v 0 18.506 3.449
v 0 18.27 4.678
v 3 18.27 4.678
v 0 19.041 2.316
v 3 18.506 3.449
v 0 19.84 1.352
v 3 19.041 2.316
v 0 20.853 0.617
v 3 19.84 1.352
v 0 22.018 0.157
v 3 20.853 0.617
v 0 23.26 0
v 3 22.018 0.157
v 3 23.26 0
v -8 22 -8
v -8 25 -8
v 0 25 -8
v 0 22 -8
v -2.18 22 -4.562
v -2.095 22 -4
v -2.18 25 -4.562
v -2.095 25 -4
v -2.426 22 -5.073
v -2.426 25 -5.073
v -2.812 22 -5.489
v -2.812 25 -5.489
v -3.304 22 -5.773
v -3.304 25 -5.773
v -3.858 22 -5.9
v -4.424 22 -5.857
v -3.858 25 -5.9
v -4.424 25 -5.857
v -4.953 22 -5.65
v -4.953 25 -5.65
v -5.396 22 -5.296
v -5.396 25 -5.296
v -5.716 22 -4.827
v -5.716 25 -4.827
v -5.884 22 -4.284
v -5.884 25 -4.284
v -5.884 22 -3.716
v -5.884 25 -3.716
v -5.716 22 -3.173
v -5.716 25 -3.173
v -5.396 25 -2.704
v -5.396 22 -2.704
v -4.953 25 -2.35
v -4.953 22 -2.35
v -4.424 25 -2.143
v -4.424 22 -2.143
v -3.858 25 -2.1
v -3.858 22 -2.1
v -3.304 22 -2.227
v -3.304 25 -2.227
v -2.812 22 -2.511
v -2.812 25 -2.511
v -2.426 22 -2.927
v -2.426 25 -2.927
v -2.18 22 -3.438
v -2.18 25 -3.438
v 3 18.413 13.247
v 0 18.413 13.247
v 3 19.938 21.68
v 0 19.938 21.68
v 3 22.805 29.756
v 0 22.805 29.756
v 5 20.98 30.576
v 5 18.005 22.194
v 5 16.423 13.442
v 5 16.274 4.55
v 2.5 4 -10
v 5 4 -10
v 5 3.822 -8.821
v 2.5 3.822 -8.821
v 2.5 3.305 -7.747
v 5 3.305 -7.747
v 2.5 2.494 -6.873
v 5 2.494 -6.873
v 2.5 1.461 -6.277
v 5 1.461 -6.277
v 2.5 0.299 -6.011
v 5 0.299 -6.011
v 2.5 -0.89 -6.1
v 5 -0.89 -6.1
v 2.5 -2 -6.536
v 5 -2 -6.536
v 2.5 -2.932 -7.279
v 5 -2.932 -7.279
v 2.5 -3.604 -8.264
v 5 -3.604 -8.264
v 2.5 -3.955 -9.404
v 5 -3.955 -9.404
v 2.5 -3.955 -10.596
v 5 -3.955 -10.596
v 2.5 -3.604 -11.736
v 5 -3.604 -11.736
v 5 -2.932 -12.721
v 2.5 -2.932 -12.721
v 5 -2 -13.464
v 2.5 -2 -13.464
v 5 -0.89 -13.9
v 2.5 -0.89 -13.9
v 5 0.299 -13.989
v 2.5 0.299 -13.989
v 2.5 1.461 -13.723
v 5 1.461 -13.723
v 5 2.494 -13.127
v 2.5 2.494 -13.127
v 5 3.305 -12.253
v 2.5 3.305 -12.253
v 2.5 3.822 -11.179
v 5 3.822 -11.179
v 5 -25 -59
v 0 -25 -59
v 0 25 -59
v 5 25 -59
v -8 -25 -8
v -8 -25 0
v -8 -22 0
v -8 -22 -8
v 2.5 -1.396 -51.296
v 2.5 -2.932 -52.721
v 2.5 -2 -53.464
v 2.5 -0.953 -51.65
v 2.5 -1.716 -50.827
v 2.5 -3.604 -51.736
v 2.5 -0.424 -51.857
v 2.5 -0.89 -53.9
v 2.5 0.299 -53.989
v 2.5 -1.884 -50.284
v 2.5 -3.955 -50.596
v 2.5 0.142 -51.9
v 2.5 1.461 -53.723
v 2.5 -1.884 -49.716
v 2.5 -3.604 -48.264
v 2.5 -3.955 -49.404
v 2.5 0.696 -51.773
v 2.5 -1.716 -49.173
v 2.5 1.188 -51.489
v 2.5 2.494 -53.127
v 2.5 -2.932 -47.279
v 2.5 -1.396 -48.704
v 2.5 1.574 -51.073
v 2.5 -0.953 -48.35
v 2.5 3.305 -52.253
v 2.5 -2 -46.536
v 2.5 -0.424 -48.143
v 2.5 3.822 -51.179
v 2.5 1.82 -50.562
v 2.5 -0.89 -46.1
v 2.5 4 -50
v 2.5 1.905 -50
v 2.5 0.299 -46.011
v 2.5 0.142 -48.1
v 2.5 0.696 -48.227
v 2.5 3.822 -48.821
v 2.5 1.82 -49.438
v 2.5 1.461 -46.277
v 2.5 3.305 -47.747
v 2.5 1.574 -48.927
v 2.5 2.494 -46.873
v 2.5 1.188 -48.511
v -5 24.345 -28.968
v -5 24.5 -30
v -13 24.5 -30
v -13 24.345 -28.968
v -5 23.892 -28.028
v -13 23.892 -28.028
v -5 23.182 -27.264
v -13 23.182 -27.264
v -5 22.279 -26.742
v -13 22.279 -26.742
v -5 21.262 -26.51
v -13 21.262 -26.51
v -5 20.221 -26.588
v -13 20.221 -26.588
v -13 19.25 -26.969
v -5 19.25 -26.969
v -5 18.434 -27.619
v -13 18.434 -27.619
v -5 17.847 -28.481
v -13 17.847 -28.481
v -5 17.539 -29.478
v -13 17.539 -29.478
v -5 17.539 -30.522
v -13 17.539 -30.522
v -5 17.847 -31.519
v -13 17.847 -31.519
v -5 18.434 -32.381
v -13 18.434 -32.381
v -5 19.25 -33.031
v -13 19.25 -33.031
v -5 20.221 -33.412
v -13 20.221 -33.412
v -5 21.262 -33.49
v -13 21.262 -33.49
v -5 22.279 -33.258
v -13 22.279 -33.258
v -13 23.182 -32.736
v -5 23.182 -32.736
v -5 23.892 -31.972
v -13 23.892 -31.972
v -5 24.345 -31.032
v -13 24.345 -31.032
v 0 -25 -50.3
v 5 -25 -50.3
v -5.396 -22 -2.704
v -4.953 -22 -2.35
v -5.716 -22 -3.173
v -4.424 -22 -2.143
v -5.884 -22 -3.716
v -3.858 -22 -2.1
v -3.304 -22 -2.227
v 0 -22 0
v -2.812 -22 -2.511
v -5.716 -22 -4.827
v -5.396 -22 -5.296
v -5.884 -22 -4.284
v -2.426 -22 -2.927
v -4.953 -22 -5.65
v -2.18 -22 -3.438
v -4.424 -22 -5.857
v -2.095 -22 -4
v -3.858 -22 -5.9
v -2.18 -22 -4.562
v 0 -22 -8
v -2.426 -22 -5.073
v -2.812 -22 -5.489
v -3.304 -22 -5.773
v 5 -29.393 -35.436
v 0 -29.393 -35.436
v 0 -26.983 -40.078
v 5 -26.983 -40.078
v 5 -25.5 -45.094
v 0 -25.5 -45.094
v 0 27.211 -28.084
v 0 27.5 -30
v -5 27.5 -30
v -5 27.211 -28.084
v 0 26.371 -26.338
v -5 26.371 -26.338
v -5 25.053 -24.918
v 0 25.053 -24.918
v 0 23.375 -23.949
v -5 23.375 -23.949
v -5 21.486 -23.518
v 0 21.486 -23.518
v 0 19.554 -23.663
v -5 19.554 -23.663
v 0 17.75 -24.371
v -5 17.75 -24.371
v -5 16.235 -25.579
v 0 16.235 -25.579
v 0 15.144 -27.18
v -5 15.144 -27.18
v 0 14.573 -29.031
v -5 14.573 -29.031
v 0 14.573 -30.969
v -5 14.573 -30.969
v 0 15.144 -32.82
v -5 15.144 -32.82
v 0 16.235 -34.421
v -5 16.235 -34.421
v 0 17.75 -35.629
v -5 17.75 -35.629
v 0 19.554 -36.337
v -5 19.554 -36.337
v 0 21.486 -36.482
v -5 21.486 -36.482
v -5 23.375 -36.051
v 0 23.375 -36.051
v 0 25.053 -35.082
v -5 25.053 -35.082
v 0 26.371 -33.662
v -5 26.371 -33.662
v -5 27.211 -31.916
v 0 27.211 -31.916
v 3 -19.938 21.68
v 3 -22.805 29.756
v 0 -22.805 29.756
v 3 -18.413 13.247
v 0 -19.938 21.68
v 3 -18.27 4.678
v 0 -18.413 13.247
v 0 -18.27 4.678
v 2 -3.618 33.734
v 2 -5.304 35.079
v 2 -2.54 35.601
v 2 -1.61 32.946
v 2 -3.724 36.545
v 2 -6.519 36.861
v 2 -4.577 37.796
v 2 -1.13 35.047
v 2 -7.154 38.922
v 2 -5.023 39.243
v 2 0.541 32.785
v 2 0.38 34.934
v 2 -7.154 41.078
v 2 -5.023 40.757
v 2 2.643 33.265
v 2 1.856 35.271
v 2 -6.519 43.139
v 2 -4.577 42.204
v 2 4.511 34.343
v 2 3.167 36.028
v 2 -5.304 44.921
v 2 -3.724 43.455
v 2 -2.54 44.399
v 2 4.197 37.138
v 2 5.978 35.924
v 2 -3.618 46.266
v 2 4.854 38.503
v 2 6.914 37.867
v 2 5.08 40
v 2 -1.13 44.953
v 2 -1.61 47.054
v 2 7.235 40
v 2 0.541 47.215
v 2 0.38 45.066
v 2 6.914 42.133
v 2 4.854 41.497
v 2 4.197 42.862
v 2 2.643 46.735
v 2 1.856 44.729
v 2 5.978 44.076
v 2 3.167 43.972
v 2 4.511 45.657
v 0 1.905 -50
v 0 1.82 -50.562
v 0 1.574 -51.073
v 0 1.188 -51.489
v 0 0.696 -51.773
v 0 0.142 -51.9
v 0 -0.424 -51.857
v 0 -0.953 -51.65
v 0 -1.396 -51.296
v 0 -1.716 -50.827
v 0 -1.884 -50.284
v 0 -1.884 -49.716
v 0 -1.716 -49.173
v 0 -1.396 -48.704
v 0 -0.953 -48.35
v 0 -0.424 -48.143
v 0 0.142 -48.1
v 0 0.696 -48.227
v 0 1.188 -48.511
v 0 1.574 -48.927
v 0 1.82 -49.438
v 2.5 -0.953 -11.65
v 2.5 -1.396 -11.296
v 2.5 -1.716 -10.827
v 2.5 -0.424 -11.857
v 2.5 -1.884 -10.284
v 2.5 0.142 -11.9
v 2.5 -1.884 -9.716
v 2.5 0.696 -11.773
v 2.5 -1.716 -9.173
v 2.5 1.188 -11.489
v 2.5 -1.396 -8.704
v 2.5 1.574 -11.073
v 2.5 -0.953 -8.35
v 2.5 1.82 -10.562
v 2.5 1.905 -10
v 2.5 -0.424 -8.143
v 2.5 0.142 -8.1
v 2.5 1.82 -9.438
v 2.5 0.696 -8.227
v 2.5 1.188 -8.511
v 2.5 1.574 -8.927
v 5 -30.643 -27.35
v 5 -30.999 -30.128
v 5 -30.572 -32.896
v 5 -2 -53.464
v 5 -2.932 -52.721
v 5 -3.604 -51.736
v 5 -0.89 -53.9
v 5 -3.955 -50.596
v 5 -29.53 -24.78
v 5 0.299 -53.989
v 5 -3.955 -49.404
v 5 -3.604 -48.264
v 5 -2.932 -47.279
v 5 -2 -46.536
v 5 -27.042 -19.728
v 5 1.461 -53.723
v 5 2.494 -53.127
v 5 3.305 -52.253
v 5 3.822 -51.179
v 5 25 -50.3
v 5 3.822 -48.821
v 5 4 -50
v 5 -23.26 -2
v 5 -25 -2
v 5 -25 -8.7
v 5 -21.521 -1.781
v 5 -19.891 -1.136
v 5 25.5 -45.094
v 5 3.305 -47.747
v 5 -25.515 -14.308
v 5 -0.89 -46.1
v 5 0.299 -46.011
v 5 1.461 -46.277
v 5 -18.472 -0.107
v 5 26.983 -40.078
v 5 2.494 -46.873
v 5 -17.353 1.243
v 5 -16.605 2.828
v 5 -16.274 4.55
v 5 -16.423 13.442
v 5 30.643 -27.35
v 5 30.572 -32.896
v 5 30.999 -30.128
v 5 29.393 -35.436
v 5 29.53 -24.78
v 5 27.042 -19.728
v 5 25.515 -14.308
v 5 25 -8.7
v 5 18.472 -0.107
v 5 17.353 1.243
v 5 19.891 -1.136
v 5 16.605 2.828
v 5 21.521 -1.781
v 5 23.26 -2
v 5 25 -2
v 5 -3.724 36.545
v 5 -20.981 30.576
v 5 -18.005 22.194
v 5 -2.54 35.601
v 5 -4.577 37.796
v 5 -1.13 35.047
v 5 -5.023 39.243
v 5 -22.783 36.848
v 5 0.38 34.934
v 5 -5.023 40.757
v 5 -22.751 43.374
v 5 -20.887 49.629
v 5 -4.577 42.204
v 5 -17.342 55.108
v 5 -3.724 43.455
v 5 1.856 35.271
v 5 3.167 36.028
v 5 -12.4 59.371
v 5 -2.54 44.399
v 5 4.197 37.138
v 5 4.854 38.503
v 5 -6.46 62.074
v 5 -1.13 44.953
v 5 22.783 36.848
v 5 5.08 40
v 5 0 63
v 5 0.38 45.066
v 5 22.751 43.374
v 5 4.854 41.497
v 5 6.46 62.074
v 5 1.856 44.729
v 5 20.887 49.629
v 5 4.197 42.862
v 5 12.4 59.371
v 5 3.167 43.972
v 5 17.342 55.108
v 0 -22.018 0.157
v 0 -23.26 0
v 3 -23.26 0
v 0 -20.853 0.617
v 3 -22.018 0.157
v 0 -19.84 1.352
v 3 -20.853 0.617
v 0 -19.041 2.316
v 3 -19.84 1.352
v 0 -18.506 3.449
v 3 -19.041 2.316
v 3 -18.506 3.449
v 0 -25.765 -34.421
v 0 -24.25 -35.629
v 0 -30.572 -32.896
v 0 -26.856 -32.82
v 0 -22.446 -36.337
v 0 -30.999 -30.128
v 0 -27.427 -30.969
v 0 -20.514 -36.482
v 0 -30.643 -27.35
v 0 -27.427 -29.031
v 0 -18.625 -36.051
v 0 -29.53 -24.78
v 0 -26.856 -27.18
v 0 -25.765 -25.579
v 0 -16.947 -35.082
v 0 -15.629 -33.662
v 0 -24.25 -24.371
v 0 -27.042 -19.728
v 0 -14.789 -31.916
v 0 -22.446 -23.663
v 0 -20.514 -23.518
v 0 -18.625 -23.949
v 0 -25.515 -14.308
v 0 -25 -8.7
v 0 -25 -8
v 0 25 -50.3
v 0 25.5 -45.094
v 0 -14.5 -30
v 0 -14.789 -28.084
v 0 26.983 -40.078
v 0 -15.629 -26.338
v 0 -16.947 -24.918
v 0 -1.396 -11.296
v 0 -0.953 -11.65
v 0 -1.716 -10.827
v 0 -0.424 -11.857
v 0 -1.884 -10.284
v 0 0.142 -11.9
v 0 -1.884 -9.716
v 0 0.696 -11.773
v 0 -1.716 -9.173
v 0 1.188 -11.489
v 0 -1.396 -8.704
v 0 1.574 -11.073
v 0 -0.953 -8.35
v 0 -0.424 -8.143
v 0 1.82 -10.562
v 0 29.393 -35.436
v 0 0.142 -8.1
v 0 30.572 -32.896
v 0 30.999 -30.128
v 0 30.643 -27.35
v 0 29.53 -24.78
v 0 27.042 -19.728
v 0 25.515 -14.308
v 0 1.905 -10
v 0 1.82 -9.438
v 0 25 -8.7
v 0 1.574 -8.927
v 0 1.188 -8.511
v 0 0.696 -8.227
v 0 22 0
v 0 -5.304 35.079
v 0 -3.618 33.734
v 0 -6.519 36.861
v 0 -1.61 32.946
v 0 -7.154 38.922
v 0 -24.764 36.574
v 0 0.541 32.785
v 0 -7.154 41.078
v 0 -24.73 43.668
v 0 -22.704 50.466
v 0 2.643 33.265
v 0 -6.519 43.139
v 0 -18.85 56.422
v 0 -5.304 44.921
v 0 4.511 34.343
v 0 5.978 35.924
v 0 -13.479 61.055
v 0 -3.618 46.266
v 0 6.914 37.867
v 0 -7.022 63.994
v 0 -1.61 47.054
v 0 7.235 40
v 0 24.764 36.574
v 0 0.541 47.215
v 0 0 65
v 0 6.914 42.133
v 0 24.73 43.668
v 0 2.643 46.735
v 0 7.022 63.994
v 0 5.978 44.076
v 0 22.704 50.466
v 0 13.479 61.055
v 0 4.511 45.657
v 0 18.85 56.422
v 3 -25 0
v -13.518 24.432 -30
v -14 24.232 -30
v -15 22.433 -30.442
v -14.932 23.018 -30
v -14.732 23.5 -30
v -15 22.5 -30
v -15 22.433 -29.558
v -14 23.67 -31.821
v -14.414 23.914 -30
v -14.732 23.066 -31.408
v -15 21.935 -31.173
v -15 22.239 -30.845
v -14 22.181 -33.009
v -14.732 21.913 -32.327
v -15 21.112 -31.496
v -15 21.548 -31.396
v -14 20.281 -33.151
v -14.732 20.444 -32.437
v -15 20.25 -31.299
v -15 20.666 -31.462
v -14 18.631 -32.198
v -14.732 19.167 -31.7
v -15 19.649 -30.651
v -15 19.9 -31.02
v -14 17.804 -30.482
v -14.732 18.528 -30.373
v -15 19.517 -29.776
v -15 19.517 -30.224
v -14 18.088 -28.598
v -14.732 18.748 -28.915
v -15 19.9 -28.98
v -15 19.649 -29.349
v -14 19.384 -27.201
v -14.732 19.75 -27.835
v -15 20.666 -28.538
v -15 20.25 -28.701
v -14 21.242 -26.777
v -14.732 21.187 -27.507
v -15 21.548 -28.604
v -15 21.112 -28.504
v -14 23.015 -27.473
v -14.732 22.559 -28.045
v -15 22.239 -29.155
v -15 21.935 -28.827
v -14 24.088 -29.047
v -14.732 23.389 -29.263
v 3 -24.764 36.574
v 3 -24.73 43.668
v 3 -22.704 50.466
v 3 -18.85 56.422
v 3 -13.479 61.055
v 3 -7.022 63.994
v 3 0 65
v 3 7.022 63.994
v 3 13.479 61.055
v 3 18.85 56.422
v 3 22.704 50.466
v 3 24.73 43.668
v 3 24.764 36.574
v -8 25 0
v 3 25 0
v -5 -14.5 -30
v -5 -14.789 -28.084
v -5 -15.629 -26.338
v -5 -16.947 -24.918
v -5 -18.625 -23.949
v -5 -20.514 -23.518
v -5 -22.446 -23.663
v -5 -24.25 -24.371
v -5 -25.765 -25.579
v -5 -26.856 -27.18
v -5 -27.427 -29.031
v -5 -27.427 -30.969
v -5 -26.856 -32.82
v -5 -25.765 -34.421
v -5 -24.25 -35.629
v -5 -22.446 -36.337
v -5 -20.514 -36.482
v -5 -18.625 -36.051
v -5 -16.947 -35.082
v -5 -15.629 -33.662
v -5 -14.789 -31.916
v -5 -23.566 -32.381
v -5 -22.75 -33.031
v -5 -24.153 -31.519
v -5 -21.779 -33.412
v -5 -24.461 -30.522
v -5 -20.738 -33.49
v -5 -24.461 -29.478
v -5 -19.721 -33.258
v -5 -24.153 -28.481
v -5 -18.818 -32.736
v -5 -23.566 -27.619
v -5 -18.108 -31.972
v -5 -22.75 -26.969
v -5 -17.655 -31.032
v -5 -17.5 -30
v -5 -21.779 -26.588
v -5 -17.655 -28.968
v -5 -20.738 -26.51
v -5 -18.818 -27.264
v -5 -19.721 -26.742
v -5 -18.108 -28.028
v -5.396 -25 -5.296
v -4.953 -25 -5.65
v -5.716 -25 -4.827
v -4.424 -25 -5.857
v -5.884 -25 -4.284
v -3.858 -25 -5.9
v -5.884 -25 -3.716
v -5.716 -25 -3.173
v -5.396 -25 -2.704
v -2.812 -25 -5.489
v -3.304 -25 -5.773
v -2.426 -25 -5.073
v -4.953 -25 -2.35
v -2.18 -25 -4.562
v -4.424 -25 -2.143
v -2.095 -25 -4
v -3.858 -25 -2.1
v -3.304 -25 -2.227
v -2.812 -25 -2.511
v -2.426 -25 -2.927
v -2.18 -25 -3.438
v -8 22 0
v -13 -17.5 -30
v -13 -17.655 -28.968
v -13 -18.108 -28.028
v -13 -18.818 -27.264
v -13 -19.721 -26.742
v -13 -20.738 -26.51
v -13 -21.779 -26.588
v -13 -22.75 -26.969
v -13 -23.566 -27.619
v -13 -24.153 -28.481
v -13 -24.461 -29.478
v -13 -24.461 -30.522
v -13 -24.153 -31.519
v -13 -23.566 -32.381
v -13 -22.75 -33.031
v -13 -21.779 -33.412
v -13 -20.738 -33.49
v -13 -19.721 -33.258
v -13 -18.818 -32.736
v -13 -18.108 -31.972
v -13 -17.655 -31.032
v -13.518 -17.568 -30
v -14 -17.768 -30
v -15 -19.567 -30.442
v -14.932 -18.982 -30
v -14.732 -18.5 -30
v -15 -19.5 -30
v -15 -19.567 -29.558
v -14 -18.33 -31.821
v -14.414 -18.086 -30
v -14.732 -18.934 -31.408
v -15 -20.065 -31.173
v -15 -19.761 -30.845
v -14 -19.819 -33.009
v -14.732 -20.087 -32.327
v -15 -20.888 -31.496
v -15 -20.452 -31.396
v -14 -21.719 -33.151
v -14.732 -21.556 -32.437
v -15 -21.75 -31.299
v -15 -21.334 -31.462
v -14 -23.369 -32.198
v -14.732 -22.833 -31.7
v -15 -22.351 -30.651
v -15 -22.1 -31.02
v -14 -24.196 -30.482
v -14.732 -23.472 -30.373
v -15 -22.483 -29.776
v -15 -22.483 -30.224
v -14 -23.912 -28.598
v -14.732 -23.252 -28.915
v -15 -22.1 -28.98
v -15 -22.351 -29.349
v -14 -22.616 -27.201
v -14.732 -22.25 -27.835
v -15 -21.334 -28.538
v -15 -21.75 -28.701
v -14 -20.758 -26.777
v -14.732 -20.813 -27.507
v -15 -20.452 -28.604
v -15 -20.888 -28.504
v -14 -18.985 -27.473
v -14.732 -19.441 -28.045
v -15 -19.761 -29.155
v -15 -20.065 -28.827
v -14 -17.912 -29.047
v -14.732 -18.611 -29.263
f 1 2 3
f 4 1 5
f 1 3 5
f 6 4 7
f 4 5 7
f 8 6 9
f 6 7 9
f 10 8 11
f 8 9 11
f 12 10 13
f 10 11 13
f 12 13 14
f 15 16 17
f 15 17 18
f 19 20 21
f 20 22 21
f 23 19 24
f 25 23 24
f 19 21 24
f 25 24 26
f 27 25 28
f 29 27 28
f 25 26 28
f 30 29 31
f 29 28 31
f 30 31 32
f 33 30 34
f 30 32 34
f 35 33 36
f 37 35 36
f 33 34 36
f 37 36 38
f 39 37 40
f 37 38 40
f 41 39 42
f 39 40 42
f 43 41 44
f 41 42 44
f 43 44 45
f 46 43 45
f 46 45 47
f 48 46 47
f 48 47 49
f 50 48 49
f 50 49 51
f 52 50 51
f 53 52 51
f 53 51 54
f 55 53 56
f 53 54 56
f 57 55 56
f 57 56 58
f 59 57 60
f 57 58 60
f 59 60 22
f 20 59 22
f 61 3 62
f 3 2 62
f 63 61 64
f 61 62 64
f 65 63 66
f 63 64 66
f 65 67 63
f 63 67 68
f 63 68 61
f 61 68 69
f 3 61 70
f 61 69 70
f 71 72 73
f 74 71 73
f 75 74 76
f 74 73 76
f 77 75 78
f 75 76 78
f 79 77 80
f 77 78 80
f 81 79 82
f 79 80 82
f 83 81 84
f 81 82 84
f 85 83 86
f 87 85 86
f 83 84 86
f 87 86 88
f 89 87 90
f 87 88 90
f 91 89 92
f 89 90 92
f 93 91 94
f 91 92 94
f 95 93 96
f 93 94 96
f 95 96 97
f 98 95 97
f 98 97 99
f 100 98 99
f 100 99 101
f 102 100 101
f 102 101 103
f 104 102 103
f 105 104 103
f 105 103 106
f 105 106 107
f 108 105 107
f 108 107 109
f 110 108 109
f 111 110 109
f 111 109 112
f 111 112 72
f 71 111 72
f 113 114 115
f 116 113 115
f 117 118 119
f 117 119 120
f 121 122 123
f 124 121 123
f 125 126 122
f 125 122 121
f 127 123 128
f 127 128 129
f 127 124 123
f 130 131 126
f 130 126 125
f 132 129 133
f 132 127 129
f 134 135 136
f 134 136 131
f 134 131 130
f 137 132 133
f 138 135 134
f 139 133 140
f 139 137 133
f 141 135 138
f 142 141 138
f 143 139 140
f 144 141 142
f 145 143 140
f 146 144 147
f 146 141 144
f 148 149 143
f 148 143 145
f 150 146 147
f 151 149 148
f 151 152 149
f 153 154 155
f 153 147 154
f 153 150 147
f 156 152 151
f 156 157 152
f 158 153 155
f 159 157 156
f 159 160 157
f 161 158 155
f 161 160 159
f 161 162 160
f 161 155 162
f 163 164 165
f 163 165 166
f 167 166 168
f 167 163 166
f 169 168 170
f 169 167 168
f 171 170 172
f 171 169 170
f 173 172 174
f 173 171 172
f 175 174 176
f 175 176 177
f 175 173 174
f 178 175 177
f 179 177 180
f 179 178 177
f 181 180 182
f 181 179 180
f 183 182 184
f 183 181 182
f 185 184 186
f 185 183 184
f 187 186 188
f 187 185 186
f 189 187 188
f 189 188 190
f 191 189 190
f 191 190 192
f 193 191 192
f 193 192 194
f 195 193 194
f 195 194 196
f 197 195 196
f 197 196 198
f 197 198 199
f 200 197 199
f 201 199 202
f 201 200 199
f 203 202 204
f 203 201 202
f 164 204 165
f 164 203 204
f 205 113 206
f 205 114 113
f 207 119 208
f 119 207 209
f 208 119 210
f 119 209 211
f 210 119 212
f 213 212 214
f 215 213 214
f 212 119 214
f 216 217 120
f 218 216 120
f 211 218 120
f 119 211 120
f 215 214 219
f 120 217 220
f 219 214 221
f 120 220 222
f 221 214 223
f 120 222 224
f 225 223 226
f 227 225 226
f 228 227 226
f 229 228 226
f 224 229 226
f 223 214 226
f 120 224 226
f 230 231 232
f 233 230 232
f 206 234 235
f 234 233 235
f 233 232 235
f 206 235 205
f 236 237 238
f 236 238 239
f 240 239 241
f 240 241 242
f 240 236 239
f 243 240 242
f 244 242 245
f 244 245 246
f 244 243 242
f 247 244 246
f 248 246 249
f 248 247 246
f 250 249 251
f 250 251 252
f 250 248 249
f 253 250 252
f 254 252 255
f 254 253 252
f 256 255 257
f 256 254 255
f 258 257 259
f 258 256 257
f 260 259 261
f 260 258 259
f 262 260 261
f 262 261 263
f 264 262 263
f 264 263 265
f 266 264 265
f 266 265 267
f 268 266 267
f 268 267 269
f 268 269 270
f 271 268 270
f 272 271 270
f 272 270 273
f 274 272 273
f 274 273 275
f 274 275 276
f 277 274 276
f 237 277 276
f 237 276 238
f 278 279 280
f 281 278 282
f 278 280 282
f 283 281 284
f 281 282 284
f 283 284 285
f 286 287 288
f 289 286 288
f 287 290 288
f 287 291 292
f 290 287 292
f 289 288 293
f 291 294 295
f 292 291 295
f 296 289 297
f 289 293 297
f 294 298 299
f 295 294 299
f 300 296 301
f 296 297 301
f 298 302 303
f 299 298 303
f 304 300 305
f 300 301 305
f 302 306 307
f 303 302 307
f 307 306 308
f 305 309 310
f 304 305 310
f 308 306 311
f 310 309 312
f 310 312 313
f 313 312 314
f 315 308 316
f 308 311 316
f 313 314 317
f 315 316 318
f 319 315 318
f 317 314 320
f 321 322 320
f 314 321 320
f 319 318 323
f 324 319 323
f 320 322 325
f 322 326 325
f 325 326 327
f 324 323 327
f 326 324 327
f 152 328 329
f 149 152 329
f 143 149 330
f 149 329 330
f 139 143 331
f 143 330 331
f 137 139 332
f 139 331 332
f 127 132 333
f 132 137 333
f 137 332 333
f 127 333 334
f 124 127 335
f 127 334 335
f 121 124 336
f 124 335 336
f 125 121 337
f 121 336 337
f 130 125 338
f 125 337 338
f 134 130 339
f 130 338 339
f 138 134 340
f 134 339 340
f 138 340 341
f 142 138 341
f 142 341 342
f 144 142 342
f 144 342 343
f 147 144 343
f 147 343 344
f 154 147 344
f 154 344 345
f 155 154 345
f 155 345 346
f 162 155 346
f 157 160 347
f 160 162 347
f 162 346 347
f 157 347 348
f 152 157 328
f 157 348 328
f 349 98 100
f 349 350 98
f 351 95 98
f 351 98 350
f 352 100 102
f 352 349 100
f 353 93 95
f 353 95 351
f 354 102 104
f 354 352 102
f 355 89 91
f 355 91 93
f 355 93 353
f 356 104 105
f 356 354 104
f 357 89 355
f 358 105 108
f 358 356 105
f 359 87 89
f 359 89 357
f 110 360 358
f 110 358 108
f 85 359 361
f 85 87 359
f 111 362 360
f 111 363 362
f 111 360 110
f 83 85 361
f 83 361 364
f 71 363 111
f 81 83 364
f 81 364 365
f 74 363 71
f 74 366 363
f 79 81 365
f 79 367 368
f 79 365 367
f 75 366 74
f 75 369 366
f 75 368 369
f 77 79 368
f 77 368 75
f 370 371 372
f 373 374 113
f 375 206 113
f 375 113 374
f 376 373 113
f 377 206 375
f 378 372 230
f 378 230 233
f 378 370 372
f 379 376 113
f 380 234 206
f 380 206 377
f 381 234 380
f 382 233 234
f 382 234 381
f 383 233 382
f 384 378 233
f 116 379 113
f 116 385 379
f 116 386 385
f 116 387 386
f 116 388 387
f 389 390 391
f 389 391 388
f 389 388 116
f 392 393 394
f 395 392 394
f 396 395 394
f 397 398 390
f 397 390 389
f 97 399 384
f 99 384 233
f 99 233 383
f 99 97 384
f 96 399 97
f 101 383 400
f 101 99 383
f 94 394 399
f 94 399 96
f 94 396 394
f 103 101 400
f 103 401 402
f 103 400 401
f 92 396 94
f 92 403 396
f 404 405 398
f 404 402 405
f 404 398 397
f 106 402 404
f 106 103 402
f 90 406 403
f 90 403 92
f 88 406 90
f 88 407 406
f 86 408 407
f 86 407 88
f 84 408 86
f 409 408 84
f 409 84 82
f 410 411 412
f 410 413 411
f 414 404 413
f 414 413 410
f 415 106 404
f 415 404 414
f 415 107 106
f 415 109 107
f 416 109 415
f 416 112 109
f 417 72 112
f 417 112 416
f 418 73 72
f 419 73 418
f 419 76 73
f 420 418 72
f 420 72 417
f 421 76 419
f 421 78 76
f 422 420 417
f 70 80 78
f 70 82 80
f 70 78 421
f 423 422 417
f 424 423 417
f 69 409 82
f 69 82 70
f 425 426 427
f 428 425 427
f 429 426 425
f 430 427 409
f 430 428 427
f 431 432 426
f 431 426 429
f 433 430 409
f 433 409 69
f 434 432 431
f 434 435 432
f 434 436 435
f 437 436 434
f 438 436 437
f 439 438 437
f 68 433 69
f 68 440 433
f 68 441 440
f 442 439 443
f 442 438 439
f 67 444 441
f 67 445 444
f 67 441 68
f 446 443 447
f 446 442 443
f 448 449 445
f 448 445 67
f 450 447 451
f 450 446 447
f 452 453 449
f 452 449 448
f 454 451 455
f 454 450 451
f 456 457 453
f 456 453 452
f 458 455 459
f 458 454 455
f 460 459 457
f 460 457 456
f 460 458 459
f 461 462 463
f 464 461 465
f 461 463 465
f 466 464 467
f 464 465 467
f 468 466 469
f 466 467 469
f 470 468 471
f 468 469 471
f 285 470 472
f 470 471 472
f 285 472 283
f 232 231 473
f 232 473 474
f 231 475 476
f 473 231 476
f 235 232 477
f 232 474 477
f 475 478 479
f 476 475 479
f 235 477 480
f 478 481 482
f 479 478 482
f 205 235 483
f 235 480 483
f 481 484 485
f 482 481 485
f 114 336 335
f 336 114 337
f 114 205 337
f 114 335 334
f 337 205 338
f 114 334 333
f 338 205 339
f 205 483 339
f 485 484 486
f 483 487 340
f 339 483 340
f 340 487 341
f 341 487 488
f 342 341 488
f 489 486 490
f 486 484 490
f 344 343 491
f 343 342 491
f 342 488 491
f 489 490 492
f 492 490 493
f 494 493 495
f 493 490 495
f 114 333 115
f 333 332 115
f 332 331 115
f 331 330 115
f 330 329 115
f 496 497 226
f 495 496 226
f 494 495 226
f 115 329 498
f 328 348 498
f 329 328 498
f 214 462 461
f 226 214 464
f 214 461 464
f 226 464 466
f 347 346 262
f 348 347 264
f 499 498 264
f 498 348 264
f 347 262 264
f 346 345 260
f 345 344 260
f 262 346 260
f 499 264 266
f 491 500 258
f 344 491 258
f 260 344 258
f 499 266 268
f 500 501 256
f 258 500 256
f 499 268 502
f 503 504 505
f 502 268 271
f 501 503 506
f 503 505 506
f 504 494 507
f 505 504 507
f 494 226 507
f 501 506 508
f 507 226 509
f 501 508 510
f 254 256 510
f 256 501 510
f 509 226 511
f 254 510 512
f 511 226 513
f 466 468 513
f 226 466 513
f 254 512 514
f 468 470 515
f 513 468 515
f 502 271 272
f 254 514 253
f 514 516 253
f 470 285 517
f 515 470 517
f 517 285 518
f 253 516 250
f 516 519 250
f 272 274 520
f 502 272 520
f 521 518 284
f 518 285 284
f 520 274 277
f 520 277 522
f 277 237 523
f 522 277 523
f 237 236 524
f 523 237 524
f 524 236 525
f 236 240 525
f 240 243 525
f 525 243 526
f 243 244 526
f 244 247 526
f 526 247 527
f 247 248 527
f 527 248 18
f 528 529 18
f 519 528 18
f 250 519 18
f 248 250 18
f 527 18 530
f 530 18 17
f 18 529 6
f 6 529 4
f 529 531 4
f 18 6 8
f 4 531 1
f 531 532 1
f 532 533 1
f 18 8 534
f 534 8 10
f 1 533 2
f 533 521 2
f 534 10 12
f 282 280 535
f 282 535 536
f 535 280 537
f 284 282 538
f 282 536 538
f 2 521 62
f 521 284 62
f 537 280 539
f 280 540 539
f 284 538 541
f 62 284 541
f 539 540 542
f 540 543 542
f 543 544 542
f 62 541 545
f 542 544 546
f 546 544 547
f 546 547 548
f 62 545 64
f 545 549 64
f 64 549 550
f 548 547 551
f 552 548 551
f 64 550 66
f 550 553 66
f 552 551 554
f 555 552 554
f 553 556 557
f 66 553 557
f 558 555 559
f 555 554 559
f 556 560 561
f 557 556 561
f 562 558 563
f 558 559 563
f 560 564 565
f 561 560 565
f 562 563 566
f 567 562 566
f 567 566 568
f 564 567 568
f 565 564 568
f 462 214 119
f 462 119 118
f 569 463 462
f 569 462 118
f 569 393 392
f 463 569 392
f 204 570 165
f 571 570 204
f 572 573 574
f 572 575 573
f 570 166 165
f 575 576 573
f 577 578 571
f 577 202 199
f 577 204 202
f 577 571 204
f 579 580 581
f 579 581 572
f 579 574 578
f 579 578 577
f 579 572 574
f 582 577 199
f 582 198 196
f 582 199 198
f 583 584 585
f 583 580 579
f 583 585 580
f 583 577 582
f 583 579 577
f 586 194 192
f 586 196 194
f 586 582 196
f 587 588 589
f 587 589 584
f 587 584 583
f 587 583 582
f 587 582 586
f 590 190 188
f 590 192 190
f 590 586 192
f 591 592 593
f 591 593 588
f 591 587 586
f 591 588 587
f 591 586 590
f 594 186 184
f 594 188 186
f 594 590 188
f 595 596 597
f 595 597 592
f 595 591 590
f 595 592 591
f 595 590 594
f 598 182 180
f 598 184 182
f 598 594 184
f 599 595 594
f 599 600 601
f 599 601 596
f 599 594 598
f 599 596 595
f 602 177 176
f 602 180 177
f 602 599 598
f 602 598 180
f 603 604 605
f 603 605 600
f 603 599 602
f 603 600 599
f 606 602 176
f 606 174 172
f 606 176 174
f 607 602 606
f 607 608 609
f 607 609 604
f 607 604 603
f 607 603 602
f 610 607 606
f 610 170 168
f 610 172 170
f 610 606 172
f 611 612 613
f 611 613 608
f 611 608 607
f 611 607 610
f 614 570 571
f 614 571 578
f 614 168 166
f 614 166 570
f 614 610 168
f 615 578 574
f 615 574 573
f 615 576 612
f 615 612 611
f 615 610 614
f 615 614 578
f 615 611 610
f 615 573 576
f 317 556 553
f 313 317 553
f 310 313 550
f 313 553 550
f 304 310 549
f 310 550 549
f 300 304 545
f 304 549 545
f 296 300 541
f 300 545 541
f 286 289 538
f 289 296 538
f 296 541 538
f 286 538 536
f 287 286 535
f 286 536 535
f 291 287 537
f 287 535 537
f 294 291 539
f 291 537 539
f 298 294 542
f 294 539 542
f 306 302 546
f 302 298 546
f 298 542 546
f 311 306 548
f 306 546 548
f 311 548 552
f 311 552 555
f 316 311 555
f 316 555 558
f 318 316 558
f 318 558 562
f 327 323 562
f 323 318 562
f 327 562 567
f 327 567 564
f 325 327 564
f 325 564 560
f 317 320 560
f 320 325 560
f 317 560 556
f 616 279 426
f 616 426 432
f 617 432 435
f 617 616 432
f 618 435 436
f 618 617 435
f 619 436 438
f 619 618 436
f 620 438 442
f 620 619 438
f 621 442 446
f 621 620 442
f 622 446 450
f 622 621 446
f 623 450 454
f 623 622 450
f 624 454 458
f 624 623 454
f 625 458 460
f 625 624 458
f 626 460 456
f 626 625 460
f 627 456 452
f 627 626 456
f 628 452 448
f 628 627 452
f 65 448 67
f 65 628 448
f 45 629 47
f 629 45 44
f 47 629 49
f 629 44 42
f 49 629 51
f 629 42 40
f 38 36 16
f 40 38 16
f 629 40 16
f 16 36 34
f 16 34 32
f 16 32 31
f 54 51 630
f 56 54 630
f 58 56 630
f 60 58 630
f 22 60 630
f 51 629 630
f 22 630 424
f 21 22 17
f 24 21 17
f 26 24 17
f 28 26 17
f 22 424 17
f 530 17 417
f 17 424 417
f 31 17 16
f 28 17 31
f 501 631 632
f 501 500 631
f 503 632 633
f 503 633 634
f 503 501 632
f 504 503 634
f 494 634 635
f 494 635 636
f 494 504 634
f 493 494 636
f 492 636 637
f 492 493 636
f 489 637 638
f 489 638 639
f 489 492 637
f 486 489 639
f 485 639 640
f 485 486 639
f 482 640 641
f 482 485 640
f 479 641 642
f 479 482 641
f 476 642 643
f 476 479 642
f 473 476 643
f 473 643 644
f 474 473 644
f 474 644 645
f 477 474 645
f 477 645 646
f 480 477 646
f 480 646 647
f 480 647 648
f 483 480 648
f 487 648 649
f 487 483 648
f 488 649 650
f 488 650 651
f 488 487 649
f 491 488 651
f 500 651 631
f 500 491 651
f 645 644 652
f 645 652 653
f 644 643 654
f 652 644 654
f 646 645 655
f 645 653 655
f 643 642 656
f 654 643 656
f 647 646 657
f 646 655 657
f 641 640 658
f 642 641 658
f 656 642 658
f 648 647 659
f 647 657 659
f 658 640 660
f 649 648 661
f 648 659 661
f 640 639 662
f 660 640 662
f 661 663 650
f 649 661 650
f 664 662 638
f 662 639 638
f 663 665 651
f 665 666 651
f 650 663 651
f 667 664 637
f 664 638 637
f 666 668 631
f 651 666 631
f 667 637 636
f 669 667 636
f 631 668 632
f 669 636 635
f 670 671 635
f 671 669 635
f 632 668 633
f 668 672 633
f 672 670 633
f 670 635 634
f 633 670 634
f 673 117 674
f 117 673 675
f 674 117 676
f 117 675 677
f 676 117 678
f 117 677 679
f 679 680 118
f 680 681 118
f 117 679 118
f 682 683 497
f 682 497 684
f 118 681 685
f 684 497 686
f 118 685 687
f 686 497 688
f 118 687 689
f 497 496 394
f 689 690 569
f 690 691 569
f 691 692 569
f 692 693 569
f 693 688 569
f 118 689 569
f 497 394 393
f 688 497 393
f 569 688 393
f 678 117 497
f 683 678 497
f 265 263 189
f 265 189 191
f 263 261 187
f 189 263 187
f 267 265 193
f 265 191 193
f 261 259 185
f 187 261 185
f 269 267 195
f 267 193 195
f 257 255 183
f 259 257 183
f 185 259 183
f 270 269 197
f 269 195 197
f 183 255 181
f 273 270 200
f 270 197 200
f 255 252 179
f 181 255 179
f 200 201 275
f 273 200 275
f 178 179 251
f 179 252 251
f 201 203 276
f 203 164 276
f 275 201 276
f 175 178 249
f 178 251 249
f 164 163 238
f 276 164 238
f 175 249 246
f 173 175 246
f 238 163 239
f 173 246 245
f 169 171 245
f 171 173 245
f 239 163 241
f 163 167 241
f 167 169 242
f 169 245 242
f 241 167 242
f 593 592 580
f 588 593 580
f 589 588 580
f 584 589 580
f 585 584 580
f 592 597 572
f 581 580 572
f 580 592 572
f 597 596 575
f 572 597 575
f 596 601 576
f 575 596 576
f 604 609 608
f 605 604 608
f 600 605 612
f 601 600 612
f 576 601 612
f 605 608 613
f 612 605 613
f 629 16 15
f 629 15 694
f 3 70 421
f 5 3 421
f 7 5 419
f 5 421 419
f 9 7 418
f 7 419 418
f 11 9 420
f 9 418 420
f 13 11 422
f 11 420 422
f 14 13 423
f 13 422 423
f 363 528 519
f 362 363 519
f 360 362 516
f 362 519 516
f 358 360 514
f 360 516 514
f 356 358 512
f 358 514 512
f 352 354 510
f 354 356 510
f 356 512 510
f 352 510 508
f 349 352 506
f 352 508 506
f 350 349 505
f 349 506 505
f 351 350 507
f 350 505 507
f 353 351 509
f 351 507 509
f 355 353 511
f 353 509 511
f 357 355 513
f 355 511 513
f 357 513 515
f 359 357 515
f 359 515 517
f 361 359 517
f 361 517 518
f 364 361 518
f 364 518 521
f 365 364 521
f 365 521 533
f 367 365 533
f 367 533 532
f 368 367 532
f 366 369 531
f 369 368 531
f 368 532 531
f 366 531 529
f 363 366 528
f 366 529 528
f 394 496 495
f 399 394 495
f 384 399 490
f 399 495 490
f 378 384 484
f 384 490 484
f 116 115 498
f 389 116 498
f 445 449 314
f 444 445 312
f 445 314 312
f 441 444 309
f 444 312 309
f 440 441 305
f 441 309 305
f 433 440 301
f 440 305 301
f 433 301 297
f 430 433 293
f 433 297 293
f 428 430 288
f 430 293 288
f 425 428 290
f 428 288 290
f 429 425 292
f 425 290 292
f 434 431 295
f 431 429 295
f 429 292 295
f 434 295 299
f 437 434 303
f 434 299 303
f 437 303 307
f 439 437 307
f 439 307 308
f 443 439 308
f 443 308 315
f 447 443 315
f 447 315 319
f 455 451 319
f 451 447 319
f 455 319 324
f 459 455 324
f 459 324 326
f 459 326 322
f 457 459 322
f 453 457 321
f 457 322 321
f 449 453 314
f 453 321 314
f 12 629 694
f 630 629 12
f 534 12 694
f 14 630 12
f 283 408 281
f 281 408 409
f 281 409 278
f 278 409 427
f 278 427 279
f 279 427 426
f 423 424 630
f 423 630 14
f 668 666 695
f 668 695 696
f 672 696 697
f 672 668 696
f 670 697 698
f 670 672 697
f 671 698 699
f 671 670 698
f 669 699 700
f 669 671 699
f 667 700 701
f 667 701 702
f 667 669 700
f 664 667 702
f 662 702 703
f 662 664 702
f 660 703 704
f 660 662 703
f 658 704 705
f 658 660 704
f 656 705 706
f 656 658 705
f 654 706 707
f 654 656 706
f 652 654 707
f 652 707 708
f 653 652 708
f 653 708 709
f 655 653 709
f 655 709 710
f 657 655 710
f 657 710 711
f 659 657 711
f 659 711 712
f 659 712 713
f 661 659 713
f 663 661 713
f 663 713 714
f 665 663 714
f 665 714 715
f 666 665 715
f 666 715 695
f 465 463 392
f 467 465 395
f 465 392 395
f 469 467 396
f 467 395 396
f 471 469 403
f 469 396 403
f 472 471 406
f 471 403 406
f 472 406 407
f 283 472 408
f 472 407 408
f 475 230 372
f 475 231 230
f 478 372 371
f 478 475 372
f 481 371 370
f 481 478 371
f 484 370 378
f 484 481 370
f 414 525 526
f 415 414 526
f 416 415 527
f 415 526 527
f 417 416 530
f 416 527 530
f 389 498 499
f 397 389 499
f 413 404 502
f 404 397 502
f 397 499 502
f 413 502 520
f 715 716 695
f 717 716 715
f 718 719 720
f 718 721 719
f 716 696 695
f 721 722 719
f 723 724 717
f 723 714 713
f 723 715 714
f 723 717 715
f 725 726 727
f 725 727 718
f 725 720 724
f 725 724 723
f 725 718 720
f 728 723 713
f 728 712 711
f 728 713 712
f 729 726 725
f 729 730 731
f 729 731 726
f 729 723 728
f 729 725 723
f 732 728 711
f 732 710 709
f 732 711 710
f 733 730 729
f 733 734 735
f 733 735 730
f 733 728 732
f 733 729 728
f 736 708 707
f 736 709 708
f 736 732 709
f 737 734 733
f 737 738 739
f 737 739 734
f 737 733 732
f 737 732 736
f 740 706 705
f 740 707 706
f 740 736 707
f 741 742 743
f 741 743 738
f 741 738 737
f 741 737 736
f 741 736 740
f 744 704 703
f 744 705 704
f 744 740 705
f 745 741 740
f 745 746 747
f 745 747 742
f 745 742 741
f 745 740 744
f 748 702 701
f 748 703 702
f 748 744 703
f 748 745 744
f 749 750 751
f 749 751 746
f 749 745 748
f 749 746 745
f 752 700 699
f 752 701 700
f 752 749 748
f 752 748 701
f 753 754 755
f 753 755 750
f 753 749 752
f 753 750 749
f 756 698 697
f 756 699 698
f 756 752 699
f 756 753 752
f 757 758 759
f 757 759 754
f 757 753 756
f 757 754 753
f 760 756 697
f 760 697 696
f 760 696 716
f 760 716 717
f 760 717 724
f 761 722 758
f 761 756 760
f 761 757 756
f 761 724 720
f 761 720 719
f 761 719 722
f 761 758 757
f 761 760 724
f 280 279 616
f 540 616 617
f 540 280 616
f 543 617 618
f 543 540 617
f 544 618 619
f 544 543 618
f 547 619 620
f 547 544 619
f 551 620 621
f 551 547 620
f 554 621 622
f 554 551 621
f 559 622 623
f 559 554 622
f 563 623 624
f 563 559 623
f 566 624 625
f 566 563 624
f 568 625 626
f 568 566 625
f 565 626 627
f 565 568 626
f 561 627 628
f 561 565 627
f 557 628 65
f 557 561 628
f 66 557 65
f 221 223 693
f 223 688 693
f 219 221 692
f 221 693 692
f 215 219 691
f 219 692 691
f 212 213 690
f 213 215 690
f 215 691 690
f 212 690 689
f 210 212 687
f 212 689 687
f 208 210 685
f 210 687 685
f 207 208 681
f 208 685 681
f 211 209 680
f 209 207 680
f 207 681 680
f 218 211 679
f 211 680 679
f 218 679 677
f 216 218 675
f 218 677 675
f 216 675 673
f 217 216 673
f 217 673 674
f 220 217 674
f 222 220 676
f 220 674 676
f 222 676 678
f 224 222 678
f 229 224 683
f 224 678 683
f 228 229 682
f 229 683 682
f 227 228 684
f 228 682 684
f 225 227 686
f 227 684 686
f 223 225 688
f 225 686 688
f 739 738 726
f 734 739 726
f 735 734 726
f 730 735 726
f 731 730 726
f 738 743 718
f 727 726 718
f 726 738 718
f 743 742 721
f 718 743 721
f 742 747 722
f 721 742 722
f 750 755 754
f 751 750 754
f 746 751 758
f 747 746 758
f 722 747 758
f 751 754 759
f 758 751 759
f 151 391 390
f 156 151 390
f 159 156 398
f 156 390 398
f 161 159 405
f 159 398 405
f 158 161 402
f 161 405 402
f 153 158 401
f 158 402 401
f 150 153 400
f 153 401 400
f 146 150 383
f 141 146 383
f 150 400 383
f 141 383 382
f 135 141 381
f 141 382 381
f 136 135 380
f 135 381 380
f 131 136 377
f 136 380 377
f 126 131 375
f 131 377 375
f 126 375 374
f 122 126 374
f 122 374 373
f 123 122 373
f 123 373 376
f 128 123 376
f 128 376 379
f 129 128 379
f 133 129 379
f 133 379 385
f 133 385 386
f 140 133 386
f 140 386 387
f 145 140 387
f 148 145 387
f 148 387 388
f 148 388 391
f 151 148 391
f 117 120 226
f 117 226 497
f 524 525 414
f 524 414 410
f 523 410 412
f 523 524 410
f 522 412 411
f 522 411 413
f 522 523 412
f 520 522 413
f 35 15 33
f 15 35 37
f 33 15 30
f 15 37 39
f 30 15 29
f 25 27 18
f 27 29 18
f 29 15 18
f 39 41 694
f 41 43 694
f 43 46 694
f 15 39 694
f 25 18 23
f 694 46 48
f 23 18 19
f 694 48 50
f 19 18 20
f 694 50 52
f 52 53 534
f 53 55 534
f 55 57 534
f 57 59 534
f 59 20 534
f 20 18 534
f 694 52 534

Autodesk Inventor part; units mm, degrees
ref_plane "YZ Plane" through (0, 0, 0) normal (1, 0, 0) x (0, 1, 0)
ref_plane "XZ Plane" through (0, 0, 0) normal (0, 1, 0) x (-1, 0, 0)
ref_plane "XY Plane" through (0, 0, 0) normal (0, 0, 1) x (1, 0, 0)
sketch "Sketch1" plane through (0, 0, 0) normal (1, 0, 0) x (0, 1, 0)
  line L0 (0, 0) -> (0, -10) construction
  line L1 (0, -10) -> (0, -50) construction
  circle A0 centre (0, -10) radius 1.905
  circle A1 centre (0, -50) radius 1.905
  line L2 (10, 0) -> (10, -59)
  line L3 (10, -59) -> (0, -59)
  line L4 (0, -59) -> (-10, -59)
  line L5 (-10, -59) -> (-10, 0)
  line L6 (0, 0) -> (10, 0)
  line L7 (0, 0) -> (-10, 0)
  line L8 (0, -50) -> (0, -59) construction
  circle A2 centre (0, 40) radius 25
  line L9 (10, 0) -> (10, 10)
  line L10 (10, 10) -> (-10, 10)
  line L11 (-10, 10) -> (-10, 0)
  arc A3 (22.8049, 29.7561) -> (10, -30) centre (155.8333, -30) ccw
  arc A4 (-10, -30) -> (-22.8049, 29.7561) centre (-155.8333, -30) ccw
  line L12 (0, -30) -> (21, -30) construction
  line L13 (0, -30) -> (-21, -30) construction
  circle A5 centre (21, -30) radius 3.5
  circle A6 centre (-21, -30) radius 3.5
  circle A7 centre (21, -30) radius 10
  circle A8 centre (-21, -30) radius 10
  circle A9 centre (21, -30) radius 6.5
  circle A10 centre (-21, -30) radius 6.5
  line L14 (-10, -59) -> (-25, -59)
  line L15 (10, -59) -> (25, -59)
  arc A11 (-28.9586, -23.9452) -> (-22.8049, 29.7561) centre (-71.0556, 8.082) ccw
  arc A12 (22.8049, 29.7561) -> (28.9586, -23.9452) centre (71.0556, 8.082) ccw
  line L16 (0, 0) -> (15, 0)
  line L17 (10, 0) -> (25, 0)
  line L18 (25, -59) -> (25, -50.3)
  arc A13 (29.3932, -35.4364) -> (25, -50.3) centre (52.3408, -50.3) ccw
  line L19 (25, 0) -> (25, -8.7)
  arc A14 (25, -8.7) -> (29.5297, -24.7804) centre (55.8075, -8.7) ccw
  line L20 (-10, 0) -> (-25, 0)
  line L21 (-25, -59) -> (-25, -50.3)
  arc A15 (-25, -50.3) -> (-29.3932, -35.4364) centre (-52.3408, -50.3) ccw
  line L22 (-25, 0) -> (-25, -8.7)
  arc A16 (-29.5297, -24.7804) -> (-25, -8.7) centre (-55.8075, -8.7) ccw
  circle A17 centre (0, -50) radius 4
  circle A18 centre (0, -10) radius 4
  circle A19 centre (0, 40) radius 7.235
  circle A20 centre (0, 40) radius 5.08
  point P0 (-10, -30)
  point P1 (10, -30)
  point P2 (23.8246, -39.5928)
  point P3 (10, -63.336)
  point P4 (-30.2308, -33.8462)
  point P5 (28.9586, -23.9452)
  point P6 (22.8049, 29.7561)
  point P7 (30.2308, -26.1538)
  point P8 (18.7815, 0)
  point P9 (-18.7815, 0)
  point P10 (-13.1191, 0)
  point P11 (-29.3932, -35.4364)
  dimension "d0" = 3.81
  dimension "d1" = 3.81
  dimension "d2" = 40
  dimension "d3" = 10
  dimension "d5" = 9
  dimension "d7" = 10
  dimension "d8" = 10
  dimension "d9" = 50
  dimension "d12" = 30
  dimension "d13" = 10
  dimension "d14" = 20
  dimension "d30" = 21
  dimension "d31" = 7
  dimension "d32" = 7
  dimension "d33" = 20
  dimension "d34" = 20
  dimension "d38" = 3
  dimension "d48" = 15
  dimension "d55" = 15
  dimension "d56" = 8.7
  dimension "d57" = 8.7
  dimension "d58" = 15
  dimension "d134" = 8
  dimension "d135" = 8
  dimension "d138" = 14.47
  dimension "d157" = 10.16
extrude "Extrusion1" add sketch "Sketch1" along normal blind 5 contours L16 A3 L2 | L2 L3 L4 L5 L7 L6 | L6 L7 L11 L10 L9 | L9 L10 L11 L20 A4 A2 A3 L16 | A3 L16 L17 A12 A7 A13 L18 L15 L2 | A3 A12 L17 L16 | L5 A4 L20 | A2 | L5 L14 L21 A15 A8 A11 L20 A4 | L20 A11 A4 | L17 L19 A14 A7 A12 | A11 A8 A16 L22 L20 | A7 | A8 | A5 | A6 | A9 | A10 | A17 | A18 | A19 | A20
fillet "Face Fillet1" radius 5 1 edges at (2.5, -18.7815, 0)
fillet "Face Fillet2" radius 5 1 edges at (2.5, 18.7815, 0)
extrude "Extrusion16" cut sketch "Sketch1" along normal up to surface (5 mm away) contours A20
extrude "Extrusion17" cut sketch "Sketch1" along normal blind 2 from surface at 0 contours A19 | A20
extrude "Extrusion11" cut sketch "Sketch1" against normal blind 2.5 from surface at 5 contours A17 | A18
extrude "Extrusion19" add sketch "Sketch1" against normal blind 15 contours A5 | A6
extrude "Extrusion20" add sketch "Sketch1" against normal blind 5 contours A9 | A10
fillet "Fillet4" radius 2 2 edges at (-15, 17.5, -30) (-15, -24.5, -30)
chamfer "Chamfer2" distance 2 angle 45 7 edges at (5, 0, 65) (5, -19.0046, 17.4944) (5, -19.8398, 1.3525) (5, -24.1298, 0) (5, 19.0046, 17.4944) (5, 19.8398, 1.3525) (5, 24.1298, 0)
sketch "Sketch15" plane through (0, 0, 0) normal (-1, 0, 0) x (0, 0, 1)
  line L0 (0, 25) -> (0, 23.2597) projected
  line L1 (0, 25) -> (-8, 25)
  line L2 (-8, 25) -> (-8, 22)
  line L3 (-8, 22) -> (0, 22)
  line L4 (0, 22) -> (0, 25)
  point P0 (0, 0)
  dimension "d175" = 8
  dimension "d176" = 3
extrude "Extrusion21" add sketch "Sketch15" along normal blind 8
sketch "Sketch16" plane through (0, 25, -8.7) normal (0, 1, 0) x (1, 0, 0)
  circle A0 centre (-4, -4.7) radius 1.905
  line L0 (-8, -8.7) -> (-8, -0.7) projected
  line L1 (-8, -8.7) -> (3, -8.7) projected
  point P0 (0, -8.7)
  dimension "d179" = 3.81
  dimension "d180" = 4
  dimension "d181" = 4
extrude "Extrusion22" cut sketch "Sketch16" against normal up to surface (3 mm away)
mirror "Mirror2" about plane through (0, 0, 0) normal (0, 1, 0) of "Extrusion22", "Extrusion21"
equation "\"d0\" = M4_HOLE_D"
equation "\"d1\" = d0"
equation "\"d14\" = 0.5 * d2"
equation "\"d32\" = d31"
equation "\"d34\" = d33"
equation "\"M4_HOLE_D\" = 3.81"
equation "\"M3_HOLE_D\" = 2.54"
equation "\"d88\" = 3"
properties part number "bldc_arm" material "ABS Plastic"
